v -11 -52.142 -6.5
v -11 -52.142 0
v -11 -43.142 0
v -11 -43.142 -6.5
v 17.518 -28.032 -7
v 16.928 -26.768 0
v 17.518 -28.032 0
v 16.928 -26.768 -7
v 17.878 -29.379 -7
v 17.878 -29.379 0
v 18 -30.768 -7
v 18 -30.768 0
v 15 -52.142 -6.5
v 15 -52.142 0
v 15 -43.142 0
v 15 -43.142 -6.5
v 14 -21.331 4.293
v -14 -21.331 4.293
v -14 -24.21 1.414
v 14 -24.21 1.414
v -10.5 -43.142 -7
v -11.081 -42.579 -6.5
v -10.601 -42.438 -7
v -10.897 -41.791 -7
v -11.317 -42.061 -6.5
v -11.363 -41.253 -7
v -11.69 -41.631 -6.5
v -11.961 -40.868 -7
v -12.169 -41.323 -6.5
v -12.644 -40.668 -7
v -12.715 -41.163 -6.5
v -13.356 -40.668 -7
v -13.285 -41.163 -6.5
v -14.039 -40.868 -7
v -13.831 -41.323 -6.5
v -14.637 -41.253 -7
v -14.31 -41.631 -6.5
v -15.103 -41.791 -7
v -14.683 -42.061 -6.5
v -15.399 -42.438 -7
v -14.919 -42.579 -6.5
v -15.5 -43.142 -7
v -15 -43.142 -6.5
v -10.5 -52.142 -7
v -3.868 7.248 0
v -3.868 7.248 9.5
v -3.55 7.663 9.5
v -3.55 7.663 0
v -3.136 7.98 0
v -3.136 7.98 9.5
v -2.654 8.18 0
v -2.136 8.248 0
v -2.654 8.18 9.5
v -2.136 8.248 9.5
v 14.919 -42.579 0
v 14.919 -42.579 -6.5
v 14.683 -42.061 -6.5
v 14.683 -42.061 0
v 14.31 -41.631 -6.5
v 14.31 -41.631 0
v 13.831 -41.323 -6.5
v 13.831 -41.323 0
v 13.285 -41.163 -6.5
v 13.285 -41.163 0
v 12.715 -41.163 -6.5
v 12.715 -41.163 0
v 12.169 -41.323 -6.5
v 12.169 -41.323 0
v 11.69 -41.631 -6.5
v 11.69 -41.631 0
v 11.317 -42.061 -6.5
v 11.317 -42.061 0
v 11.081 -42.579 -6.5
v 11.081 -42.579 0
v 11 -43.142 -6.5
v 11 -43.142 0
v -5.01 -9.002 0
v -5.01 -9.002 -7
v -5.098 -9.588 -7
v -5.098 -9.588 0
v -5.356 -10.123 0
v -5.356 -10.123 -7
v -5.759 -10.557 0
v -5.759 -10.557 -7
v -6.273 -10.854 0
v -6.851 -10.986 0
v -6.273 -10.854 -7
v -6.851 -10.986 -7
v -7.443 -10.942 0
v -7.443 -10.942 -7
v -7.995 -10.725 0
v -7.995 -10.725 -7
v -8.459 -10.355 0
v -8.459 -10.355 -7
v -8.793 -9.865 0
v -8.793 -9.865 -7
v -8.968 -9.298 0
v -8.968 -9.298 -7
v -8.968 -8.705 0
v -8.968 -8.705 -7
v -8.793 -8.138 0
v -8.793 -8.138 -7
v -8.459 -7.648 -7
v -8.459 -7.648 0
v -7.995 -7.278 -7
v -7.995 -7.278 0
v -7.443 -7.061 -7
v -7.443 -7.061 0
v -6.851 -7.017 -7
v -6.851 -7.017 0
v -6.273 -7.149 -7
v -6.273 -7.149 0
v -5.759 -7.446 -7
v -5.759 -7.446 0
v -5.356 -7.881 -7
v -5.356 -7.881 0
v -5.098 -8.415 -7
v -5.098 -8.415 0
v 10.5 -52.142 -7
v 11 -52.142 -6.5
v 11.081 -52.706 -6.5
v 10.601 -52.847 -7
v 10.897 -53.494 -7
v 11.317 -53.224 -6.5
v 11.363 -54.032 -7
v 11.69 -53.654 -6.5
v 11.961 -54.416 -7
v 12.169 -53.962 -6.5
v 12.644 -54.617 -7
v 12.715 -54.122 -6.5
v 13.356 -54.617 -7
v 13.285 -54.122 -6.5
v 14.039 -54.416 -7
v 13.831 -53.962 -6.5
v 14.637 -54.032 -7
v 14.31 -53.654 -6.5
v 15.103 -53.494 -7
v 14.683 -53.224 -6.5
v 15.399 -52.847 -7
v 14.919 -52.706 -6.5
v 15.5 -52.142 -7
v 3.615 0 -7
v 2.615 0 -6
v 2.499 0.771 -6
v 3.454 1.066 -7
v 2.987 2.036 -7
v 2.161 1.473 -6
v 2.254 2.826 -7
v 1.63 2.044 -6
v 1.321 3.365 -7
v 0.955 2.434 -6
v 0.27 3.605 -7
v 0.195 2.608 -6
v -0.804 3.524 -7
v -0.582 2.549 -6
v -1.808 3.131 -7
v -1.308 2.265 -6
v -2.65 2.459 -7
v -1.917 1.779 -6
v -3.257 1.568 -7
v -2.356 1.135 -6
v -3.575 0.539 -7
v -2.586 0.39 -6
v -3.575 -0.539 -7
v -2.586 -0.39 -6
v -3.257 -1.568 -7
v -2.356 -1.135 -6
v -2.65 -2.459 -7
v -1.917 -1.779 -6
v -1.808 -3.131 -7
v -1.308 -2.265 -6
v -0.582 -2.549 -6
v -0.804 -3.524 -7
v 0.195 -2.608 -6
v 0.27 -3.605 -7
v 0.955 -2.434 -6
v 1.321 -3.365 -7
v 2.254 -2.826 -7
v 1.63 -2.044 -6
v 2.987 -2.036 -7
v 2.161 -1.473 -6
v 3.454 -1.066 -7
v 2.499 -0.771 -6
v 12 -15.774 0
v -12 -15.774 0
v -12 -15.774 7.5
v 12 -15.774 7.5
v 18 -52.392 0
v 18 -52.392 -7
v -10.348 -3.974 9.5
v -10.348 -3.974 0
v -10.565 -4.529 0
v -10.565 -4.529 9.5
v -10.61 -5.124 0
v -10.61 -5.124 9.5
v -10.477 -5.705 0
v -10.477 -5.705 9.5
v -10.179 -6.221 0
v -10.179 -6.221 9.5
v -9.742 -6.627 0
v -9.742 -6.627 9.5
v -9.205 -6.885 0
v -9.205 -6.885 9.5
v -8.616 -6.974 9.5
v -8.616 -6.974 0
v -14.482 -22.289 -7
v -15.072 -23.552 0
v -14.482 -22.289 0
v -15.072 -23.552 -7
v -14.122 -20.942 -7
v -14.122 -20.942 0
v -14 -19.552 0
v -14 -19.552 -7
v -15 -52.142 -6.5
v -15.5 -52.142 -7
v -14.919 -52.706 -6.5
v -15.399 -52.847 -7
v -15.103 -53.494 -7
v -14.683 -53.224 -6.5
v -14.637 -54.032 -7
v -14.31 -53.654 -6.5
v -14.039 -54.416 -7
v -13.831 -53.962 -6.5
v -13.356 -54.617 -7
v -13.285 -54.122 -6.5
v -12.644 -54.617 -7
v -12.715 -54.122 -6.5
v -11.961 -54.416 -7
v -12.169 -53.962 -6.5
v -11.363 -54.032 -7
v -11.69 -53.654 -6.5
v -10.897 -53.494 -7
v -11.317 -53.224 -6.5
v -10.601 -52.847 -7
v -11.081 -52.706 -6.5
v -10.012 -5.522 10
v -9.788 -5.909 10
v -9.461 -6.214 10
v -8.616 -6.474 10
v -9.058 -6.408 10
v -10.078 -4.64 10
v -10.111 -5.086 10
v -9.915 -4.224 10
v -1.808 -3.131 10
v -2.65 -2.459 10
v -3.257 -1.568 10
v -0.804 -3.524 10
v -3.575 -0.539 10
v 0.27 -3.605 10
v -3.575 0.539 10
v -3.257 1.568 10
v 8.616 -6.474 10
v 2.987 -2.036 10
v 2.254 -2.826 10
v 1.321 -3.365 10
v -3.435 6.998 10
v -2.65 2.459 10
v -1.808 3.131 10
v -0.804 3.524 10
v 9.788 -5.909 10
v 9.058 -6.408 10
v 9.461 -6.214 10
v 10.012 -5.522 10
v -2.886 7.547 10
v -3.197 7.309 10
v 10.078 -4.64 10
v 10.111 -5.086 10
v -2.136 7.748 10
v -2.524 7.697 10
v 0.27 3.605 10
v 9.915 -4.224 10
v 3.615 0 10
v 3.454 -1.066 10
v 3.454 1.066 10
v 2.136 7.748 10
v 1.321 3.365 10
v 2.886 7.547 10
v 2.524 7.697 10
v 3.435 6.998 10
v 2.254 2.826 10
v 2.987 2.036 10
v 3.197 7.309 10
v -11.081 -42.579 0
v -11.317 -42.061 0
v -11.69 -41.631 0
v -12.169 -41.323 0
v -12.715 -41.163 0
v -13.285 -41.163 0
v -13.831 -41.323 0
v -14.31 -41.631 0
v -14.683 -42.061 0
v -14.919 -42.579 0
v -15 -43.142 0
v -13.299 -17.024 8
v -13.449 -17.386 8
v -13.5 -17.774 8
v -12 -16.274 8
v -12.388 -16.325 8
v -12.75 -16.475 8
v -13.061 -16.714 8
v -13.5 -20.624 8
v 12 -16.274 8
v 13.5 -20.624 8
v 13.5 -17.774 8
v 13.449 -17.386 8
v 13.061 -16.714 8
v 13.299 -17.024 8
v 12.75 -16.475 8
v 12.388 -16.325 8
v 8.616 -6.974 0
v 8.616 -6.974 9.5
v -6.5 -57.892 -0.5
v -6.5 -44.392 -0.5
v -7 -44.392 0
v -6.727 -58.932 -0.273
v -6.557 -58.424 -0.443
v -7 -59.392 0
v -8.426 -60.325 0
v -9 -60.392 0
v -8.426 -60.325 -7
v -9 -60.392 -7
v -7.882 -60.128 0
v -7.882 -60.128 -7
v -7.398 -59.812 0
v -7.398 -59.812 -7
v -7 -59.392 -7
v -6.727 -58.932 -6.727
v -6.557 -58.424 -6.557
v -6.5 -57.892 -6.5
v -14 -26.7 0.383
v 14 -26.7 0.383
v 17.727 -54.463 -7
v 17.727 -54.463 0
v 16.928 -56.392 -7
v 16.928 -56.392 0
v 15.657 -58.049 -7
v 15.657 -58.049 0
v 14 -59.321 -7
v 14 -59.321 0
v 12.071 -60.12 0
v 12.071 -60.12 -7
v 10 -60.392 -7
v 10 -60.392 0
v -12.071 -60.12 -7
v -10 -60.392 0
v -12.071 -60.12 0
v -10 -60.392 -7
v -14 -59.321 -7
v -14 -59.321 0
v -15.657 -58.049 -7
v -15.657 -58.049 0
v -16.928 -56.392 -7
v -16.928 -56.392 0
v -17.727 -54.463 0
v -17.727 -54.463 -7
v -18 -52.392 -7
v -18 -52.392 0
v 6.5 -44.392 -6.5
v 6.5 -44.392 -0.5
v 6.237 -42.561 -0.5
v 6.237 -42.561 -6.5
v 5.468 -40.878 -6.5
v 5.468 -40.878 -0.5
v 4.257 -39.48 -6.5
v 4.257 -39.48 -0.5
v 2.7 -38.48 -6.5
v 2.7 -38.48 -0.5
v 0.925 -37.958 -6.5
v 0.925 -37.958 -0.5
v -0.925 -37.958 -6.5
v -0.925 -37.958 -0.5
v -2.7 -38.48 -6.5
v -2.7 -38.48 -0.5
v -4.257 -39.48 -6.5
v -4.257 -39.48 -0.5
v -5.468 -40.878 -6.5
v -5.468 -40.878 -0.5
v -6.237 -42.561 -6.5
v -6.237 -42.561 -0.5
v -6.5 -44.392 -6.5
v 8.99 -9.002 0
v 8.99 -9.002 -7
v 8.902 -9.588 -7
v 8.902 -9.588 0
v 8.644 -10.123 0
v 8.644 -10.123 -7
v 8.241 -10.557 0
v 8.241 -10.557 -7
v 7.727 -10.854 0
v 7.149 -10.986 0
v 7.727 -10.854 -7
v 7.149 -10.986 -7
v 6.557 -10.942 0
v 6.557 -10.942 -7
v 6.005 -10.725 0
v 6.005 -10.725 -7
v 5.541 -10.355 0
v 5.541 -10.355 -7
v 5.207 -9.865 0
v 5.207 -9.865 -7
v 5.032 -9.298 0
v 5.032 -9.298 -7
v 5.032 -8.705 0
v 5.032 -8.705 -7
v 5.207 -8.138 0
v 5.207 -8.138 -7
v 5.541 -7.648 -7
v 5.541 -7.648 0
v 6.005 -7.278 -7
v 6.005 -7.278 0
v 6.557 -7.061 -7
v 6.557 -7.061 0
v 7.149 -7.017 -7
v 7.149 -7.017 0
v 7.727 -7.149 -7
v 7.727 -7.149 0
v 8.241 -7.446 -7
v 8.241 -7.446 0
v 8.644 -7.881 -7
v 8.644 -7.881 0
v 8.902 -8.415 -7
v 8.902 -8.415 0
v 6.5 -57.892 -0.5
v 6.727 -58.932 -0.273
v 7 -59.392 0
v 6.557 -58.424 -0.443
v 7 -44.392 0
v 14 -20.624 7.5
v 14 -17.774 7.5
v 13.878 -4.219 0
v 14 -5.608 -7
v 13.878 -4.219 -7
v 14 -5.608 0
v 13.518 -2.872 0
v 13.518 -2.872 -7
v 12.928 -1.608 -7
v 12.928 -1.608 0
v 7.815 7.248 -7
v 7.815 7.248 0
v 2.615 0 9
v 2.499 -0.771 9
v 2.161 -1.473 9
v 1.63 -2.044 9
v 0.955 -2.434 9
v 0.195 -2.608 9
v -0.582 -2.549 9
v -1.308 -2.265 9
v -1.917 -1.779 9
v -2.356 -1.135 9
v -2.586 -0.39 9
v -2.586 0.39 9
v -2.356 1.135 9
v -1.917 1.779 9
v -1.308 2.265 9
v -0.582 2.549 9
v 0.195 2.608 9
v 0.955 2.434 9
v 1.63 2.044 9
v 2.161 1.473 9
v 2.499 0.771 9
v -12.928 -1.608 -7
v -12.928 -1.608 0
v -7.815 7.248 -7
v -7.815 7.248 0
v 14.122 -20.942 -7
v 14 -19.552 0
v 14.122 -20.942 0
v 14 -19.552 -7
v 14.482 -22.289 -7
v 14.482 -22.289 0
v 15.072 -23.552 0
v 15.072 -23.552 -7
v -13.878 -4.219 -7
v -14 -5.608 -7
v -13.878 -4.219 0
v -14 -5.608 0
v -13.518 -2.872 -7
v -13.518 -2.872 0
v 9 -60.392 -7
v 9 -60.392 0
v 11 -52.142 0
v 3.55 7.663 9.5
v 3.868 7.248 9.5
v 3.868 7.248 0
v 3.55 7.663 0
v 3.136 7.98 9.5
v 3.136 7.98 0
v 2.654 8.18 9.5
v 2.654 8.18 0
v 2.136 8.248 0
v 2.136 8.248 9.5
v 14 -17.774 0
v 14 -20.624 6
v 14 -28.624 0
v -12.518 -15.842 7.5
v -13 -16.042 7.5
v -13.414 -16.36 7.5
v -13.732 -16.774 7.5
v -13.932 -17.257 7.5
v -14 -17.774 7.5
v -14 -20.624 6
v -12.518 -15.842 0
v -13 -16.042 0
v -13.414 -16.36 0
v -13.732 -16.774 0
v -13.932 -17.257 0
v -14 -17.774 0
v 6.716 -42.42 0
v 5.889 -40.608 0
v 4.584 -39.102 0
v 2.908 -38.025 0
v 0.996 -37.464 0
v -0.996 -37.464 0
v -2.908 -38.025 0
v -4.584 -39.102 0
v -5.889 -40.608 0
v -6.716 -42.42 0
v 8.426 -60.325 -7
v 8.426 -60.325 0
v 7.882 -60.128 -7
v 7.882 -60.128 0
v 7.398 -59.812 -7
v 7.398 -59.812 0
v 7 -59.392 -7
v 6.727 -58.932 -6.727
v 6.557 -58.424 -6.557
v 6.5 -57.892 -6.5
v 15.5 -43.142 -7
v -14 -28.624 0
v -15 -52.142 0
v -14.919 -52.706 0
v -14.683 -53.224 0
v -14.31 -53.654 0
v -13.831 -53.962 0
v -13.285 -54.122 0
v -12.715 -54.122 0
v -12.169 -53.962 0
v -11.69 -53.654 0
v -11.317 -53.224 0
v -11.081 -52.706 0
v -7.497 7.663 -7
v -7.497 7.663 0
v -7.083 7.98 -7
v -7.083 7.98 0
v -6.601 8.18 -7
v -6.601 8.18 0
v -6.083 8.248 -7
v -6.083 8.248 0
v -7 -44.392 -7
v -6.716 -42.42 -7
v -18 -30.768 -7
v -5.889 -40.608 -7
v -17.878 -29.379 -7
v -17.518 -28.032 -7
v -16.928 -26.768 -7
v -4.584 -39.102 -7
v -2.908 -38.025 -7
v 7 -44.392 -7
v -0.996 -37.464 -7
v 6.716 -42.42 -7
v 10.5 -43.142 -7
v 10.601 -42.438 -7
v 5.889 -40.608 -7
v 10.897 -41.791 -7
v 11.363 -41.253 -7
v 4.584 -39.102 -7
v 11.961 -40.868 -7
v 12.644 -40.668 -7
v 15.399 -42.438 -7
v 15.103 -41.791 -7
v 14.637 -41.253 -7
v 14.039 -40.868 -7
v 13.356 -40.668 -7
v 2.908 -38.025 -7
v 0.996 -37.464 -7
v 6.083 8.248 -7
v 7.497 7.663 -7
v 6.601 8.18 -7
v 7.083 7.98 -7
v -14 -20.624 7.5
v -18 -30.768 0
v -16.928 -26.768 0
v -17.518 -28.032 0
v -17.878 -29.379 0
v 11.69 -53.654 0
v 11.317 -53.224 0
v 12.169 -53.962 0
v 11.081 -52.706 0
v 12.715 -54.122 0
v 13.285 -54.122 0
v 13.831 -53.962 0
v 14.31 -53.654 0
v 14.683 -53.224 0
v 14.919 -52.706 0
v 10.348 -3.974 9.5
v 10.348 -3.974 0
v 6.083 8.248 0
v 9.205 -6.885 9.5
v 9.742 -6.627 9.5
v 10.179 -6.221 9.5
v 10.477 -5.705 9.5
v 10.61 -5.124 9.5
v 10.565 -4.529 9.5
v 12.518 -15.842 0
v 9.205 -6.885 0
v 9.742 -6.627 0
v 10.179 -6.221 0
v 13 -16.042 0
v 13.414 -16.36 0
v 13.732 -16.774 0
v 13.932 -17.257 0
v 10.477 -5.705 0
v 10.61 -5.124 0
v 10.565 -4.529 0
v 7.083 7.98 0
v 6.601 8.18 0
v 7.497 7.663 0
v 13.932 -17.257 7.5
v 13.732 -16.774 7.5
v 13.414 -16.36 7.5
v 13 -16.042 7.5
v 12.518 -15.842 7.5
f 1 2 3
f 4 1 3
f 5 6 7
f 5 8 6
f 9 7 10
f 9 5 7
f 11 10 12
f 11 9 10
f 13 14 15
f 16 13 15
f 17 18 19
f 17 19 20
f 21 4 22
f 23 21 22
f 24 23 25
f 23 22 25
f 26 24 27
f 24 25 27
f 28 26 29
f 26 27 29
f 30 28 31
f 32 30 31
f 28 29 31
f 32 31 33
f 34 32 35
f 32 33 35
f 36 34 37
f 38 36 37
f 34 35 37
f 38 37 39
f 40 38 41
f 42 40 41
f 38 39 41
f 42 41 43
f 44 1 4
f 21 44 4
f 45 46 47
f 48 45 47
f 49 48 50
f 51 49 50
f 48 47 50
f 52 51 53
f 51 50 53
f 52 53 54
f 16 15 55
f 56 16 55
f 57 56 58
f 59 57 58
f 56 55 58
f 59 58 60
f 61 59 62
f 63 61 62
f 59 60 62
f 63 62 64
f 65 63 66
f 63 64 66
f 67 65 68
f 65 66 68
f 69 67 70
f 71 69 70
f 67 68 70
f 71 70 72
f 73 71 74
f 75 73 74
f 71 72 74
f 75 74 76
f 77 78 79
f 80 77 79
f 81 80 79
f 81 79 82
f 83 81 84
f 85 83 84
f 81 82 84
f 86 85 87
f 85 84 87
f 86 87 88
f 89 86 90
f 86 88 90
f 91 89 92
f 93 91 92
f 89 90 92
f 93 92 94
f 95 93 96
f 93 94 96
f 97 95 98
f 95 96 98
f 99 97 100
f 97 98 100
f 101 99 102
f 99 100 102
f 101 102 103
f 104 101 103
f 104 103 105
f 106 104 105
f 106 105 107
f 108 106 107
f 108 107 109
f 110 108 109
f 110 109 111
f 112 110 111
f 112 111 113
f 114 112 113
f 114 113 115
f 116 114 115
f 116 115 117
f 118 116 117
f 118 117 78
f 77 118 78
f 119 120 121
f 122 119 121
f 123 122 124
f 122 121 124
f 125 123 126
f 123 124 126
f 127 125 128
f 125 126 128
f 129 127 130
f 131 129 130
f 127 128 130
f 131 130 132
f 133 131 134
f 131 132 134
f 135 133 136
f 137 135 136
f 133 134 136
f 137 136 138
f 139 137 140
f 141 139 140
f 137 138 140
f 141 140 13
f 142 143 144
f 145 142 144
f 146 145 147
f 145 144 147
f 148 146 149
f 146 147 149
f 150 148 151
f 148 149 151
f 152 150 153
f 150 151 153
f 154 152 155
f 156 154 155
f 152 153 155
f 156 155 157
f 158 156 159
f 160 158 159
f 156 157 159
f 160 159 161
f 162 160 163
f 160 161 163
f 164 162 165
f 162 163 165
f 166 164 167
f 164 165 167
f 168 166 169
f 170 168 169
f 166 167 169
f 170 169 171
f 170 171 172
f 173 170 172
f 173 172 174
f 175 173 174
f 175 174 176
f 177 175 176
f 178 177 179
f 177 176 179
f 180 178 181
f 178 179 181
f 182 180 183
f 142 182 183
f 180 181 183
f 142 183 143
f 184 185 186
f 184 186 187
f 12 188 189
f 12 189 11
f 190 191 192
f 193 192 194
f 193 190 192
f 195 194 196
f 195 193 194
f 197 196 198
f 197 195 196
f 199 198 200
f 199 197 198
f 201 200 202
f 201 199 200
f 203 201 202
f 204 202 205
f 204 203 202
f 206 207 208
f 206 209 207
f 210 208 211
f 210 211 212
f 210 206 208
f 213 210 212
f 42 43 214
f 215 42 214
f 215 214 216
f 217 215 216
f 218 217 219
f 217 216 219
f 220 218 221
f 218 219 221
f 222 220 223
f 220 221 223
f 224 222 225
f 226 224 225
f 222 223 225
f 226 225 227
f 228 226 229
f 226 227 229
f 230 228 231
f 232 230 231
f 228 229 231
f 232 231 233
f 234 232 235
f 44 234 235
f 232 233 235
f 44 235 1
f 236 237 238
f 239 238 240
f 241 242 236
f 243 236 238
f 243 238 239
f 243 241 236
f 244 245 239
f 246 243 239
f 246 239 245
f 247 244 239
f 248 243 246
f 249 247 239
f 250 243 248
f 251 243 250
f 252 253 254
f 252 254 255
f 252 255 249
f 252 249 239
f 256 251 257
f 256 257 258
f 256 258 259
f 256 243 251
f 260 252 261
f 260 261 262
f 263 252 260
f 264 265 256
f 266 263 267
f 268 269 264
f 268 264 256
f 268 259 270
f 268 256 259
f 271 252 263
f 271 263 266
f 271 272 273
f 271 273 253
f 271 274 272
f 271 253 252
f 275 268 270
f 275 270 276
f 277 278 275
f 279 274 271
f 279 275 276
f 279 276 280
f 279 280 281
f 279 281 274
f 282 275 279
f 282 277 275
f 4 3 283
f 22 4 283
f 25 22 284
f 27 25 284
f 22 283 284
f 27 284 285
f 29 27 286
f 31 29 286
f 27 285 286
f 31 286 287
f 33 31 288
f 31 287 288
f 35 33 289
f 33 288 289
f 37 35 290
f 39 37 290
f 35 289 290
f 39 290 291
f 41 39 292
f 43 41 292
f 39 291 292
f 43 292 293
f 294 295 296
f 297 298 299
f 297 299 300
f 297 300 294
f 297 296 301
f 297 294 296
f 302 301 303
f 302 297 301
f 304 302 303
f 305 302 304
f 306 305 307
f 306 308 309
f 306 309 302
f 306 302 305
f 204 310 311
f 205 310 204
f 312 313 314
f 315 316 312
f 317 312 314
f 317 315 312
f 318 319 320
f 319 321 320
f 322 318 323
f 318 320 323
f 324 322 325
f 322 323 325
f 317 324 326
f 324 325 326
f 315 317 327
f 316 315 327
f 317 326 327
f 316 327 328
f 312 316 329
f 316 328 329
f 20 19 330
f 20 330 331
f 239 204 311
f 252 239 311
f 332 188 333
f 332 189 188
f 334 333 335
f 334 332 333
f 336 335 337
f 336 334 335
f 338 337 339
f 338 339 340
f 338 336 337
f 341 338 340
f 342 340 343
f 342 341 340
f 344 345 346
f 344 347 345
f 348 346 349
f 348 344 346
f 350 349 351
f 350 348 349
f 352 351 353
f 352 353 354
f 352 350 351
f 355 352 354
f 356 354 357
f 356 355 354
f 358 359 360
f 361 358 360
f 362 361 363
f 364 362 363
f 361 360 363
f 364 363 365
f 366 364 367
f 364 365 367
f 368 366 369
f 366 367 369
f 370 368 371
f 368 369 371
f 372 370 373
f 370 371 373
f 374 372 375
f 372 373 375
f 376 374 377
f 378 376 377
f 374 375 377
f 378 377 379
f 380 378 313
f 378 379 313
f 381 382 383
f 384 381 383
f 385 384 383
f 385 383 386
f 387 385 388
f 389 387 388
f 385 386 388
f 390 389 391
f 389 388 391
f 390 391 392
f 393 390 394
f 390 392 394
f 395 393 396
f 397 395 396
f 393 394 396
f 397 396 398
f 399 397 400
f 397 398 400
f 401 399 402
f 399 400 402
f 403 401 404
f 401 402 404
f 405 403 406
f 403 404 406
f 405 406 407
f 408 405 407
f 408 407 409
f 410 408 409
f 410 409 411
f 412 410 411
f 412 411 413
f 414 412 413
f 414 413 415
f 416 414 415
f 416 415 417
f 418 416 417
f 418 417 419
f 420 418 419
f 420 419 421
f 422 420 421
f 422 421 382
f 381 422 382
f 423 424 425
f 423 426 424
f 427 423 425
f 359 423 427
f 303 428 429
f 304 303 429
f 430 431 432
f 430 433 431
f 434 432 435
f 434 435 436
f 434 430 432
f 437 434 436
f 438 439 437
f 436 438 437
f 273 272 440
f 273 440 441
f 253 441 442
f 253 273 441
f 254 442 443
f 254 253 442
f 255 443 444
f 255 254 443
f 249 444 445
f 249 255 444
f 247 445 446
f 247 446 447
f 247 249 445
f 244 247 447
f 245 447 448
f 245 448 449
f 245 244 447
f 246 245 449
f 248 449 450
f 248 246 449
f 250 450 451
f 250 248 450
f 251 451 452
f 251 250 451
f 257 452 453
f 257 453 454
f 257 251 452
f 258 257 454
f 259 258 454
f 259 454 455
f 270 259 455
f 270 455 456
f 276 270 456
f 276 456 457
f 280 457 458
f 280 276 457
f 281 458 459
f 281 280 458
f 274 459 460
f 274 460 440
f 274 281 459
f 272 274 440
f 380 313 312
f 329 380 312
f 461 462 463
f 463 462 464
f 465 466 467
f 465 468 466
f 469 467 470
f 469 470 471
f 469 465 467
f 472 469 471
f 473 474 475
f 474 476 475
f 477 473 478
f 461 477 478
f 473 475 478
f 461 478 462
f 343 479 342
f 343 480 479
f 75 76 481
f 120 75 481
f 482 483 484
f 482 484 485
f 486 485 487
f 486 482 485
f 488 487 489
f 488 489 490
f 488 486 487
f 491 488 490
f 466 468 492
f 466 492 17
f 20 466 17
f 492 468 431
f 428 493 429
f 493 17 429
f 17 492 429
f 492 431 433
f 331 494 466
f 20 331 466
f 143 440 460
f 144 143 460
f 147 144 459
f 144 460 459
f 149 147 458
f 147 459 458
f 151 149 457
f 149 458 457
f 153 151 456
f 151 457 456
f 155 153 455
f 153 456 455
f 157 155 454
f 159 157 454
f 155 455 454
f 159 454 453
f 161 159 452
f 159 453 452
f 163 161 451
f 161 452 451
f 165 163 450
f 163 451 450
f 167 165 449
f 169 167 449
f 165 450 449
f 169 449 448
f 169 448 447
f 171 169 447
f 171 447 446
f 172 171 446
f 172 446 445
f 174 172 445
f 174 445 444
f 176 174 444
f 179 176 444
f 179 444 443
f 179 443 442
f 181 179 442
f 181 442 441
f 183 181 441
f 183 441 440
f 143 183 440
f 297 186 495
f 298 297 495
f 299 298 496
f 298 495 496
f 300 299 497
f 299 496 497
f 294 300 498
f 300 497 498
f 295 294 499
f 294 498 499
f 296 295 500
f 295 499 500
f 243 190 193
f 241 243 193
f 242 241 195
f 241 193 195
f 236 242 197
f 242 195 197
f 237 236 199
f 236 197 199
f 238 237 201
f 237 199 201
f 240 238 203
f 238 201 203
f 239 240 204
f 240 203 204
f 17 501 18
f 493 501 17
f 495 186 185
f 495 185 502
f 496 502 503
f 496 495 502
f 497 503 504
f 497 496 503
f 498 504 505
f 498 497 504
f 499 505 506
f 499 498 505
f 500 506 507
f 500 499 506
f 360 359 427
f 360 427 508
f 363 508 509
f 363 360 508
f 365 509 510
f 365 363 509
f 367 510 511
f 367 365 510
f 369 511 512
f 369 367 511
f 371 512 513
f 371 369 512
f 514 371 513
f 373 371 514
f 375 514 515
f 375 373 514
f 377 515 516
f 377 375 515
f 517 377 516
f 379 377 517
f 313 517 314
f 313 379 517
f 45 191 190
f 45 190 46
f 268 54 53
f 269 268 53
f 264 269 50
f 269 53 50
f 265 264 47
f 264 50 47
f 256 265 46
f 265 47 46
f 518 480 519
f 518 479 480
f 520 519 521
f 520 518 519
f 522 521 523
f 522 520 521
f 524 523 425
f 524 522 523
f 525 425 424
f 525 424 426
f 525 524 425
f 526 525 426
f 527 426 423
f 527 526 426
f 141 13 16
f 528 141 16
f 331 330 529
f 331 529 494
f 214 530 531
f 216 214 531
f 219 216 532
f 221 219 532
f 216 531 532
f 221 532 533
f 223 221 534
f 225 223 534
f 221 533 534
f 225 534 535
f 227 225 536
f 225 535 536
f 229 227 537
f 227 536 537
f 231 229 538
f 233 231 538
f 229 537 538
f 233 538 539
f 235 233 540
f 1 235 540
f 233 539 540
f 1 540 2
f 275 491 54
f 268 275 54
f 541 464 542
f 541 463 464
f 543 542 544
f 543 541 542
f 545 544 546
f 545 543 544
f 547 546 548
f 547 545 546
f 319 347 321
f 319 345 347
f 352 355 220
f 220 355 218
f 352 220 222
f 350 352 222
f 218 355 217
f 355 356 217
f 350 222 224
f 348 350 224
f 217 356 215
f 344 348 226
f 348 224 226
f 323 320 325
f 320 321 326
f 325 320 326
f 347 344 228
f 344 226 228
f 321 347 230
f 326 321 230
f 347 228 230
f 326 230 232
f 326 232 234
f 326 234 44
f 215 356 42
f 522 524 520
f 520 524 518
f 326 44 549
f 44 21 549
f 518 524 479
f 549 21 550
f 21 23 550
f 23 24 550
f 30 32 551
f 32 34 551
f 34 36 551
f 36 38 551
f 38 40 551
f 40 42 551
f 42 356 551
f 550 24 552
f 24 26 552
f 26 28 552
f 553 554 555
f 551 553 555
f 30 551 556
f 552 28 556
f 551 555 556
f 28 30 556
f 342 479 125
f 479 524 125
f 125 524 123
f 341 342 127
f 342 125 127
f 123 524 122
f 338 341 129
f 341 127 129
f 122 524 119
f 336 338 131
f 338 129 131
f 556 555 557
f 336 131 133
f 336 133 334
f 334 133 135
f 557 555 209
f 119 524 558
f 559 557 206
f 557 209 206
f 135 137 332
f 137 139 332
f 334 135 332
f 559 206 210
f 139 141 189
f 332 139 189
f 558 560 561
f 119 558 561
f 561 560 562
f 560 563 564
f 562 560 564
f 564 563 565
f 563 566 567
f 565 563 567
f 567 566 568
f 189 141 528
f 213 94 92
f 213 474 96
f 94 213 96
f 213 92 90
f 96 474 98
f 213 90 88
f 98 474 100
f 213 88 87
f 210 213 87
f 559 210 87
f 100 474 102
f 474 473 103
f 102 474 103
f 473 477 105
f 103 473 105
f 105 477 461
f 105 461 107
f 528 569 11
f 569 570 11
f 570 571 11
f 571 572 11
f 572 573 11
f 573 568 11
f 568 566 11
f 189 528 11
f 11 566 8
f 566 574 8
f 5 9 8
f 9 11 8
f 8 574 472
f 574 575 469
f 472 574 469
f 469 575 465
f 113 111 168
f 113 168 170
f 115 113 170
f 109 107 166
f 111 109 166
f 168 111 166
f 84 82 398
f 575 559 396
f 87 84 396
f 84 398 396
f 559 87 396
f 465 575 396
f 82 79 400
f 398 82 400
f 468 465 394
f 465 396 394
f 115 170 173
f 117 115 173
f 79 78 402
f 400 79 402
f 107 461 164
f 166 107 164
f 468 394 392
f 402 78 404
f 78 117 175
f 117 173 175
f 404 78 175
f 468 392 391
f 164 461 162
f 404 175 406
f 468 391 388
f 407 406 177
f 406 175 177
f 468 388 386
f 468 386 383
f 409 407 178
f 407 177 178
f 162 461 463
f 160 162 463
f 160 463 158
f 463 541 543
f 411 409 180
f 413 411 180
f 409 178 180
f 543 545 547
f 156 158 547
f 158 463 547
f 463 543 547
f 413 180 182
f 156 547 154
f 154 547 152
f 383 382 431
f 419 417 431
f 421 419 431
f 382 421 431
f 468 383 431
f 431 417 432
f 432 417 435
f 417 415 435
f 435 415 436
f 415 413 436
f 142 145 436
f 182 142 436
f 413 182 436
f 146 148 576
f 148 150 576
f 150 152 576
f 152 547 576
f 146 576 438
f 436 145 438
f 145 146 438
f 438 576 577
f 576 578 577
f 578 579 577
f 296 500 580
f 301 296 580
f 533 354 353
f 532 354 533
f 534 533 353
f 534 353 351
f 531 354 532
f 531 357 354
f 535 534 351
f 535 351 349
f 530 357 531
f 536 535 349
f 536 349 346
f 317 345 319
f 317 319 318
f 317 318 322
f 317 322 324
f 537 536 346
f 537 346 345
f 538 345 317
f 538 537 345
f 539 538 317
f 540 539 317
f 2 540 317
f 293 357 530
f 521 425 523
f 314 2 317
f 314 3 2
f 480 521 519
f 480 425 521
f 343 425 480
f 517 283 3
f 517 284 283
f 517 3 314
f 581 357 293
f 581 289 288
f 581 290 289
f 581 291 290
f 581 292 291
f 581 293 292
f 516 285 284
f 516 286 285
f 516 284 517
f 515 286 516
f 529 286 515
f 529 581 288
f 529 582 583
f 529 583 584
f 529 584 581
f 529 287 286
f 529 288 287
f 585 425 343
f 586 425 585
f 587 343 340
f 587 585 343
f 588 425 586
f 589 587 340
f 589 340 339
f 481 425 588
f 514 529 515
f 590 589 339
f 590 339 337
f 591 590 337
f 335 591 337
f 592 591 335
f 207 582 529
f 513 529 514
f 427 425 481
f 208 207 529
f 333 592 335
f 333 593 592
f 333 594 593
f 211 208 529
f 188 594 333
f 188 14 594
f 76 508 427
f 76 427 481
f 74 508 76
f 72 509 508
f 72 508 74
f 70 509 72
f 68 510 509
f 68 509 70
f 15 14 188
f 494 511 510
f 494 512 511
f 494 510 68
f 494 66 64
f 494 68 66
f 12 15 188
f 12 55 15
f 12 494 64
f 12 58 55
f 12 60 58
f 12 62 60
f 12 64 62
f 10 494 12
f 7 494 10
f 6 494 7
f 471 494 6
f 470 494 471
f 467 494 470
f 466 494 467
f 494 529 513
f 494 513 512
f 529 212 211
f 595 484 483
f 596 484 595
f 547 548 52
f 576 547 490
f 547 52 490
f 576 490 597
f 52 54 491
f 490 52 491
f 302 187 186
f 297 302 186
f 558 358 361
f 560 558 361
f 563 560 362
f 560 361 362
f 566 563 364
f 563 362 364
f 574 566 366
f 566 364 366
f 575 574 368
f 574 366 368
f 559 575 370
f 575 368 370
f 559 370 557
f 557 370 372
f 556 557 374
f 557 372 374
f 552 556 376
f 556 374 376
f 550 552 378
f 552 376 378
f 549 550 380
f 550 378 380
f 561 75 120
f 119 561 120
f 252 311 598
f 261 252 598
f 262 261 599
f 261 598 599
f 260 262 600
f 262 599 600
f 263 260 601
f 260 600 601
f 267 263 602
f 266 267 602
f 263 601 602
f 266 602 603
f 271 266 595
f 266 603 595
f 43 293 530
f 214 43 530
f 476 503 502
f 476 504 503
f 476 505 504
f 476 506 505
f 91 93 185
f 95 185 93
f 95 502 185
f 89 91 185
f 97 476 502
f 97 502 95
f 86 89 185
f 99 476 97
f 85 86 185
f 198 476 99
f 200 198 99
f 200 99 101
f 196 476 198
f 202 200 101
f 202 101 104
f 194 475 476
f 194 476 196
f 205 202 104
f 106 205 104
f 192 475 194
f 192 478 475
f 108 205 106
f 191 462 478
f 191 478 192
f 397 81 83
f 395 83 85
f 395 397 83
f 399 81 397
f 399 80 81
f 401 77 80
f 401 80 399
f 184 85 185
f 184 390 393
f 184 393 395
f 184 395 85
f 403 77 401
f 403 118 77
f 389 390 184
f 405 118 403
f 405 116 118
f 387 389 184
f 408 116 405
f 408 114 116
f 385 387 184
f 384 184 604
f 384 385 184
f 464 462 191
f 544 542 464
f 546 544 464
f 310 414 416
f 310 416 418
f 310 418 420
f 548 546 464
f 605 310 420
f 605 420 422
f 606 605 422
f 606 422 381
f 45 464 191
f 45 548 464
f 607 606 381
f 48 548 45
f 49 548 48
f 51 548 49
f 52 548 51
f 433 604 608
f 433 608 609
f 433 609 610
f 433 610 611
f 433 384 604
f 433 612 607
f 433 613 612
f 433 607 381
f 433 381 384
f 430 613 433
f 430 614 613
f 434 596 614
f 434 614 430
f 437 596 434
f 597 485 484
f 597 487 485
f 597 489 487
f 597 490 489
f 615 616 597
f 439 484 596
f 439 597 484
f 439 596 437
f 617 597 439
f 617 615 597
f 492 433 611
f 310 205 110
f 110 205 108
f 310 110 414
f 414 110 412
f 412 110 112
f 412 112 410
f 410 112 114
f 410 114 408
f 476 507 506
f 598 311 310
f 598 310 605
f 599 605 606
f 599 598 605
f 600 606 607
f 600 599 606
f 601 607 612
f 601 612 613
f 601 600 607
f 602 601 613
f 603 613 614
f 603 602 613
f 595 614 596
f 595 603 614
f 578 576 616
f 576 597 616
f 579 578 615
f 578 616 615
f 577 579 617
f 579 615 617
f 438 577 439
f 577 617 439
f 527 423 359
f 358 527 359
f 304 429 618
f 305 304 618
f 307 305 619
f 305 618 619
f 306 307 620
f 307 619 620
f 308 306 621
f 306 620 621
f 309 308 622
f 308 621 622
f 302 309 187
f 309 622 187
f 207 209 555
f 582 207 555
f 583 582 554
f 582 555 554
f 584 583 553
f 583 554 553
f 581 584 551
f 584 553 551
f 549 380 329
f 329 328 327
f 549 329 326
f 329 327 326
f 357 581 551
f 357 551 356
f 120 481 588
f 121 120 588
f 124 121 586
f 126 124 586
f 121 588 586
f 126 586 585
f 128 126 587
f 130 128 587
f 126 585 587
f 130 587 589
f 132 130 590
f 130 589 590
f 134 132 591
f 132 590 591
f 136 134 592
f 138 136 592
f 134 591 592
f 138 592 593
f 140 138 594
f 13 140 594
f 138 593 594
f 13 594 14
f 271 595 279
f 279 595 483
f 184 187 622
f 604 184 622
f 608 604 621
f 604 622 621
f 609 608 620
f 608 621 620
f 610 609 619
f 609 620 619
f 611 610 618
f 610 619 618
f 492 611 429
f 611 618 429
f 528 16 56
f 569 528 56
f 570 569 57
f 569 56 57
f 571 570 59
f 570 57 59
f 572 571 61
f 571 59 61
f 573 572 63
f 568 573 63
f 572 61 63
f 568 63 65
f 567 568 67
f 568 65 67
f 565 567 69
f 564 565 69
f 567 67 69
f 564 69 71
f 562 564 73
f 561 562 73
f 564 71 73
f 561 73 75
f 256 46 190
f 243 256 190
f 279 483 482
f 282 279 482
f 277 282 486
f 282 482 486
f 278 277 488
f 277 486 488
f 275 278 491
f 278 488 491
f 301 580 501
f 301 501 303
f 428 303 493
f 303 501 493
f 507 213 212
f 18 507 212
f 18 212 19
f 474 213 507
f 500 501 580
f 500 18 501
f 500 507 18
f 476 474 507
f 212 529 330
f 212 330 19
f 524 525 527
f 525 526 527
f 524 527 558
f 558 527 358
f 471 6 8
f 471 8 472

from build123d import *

# Parameters (mm, degrees)
F1_DEPTH      = 10
F3_DEPTH      = 7
F4_R          = 2.615
F4_W          = 5
F4_H          = 10
F5_DEPTH      = 10.001
F5_DEPTH_BACK = 25
F6_W          = 28
F6_H          = 7
F7_DEPTH      = 50
F8_W          = 28
F8_H          = 5
F9_DEPTH      = 8
F10_SIZE      = 5
F11_SIZE      = 2
F12_SIZE      = 1
F13_SIZE      = 1
F14_R         = 8
F15_SIZE      = 1
F17_DEPTH     = 10.001
F18_R         = 2
F20_DEPTH     = 7.001
F22_DEPTH     = 7
F23_R         = 8
F25_DEPTH     = 7.001
F26_SIZE      = 0.5
F27_R         = 1.99
F28_DEPTH     = 17.001
F29_R         = 2.5


# Not quite as in the source:
# - a feature names something its author has since deleted; it is built from what else it names


with BuildPart() as f1:
    # F0 (on Top) → F1 (new body)
    with BuildSketch(Plane.XY):
        Polygon((0, 14.2484272933), (-12.3395, -7.1242136467), (12.3395, -7.1242136467), align=None)
    extrude(amount=F1_DEPTH)

    # F2 (on face) → F3 (join)
    with BuildSketch(Plane(origin=(0, 0, 0), x_dir=(1, 0, 0), z_dir=(0, 0, -1))):
        Polygon((-18, 10.3923048454), (0, -20.7846096908), (18, 10.3923048454), align=None)
    extrude(amount=F3_DEPTH)

    # F4 (on Top) → F5 (cut, two sides)
    with BuildSketch(Plane.XY) as f5_sk:
        Polygon((-11.5514649078, 20.9689907423), (-11.4649338648, 8.2484272933), (13.3285973679, 8.2484272933), (13.3285973679, 20.9689907423), align=None)
        Circle(F4_R)
        with Locations((-16.5, -8)):
            Rectangle(F4_W, F4_H)
        with Locations((16.5, -8)):
            Rectangle(F4_W, F4_H)
    extrude(amount=F5_DEPTH, mode=Mode.SUBTRACT)
    extrude(f5_sk.sketch, amount=-F5_DEPTH_BACK, mode=Mode.SUBTRACT)

    # F6 (on face) → F7 (join)
    with BuildSketch(Plane.XZ.offset(10.3923048454)):
        with Locations((0, -3.5)):
            Rectangle(F6_W, F6_H)
    extrude(amount=F7_DEPTH)

    # F8 (on face) → F9 (join)
    with BuildSketch(Plane.XY):
        with Locations((0, -18.1242136467)):
            Rectangle(F8_W, F8_H)
    extrude(amount=F9_DEPTH)

    # F10
    f10_edges = [f1.edges().sort_by_distance(p)[0] for p in [
        (0, -20.624214, 0),
    ]]
    chamfer(f10_edges, length=F10_SIZE)

    # F11
    f11_edges = [f1.edges().sort_by_distance(p)[0] for p in [
        (0, -25.624214, 0),
    ]]
    chamfer(f11_edges, length=F11_SIZE)

    # F12
    f12_edges = [f1.edges().sort_by_distance(p)[0] for p in [
        (0, -27.624214, 0),
    ]]
    chamfer(f12_edges, length=F12_SIZE)

    # F13
    f13_edges = [f1.edges().sort_by_distance(p)[0] for p in [
        (0, -20.624214, 5),
    ]]
    chamfer(f13_edges, length=F13_SIZE)

    # F14
    f14_edges = [f1.edges().sort_by_distance(p)[0] for p in [
        (-14, -3.464102, -3.5),
        (14, -3.464102, -3.5),
    ]]
    fillet(f14_edges, radius=F14_R)

    # F15
    f15_edges = [f1.edges().sort_by_distance(p)[0] for p in [
        (-2.615, 0, 10),
        (-2.615, 0, -7),
    ]]
    chamfer(f15_edges, length=F15_SIZE)

    # F16 (on face) → F17 (cut, through all)
    with BuildSketch(Plane.XY):
        Polygon((12.0796923789, -6.9742136467), (-12.0796923789, -6.9742136467), (-3.2908965344, 8.2484272933), (-14, 8.2484272933), (-14, -15.7742136467), (14, -15.7742136467), (14, 8.2484272933), (7.2377682818, 8.2484272933), (3.2908965344, 8.2484272933), align=None)
    extrude(amount=F17_DEPTH, mode=Mode.SUBTRACT)

    # F18
    f18_edges = [f1.edges().sort_by_distance(p)[0] for p in [
        (-12.079692, -6.974214, 5),
        (12.079692, -6.974214, 5),
        (3.290897, 8.248427, 5),
        (-3.290897, 8.248427, 5),
        (-7.237768, 8.248427, -3.5),
        (7.237768, 8.248427, -3.5),
        (-14, -15.774214, 4),
        (14, -15.774214, 4),
    ]]
    fillet(f18_edges, radius=F18_R)

    # F19 (on face) → F20 (cut, through all)
    with BuildSketch(Plane.XY):
        with BuildLine():
            Line((6.5, -50.8923048454), (6.5, -44.3923048454))
            ThreePointArc((6.5, -44.3923048454), (0, -37.8923048454), (-6.5, -44.3923048454))
            Line((-6.5, -44.3923048454), (-6.5, -50.8923048454))
            Line((-6.5, -50.8923048454), (-6.5, -60.3923048454))
            Line((-6.5, -60.3923048454), (6.5, -60.3923048454))
            Line((6.5, -60.3923048454), (6.5, -50.8923048454))
        make_face()
    extrude(amount=-F20_DEPTH, mode=Mode.SUBTRACT)

    # F21 (on face) → F22 (join, through all)
    with BuildSketch(Plane.XY):
        Polygon((-14, -60.3923048454), (-14, -28.6242136467), (-14, -21.6960104164), (-18, -28.6242136467), (-18, -60.3923048454), align=None)
        Polygon((14, -28.6242136467), (14, -60.3923048454), (18, -60.3923048454), (18, -28.6242136467), (14, -21.6960104164), align=None)
    extrude(amount=-F22_DEPTH)

    # F23
    f23_edges = [f1.edges().sort_by_distance(p)[0] for p in [
        (18, -28.624214, -3.5),
        (14, -21.69601, -3.5),
        (-14, -21.69601, -3.5),
        (-18, -28.624214, -3.5),
        (-18, -60.392305, -3.5),
        (18, -60.392305, -3.5),
    ]]
    fillet(f23_edges, radius=F23_R)

    # F24 (on face) → F25 (cut, through all)
    with BuildSketch(Plane.XY):
        with BuildLine():
            Line((-11, -52.1423048454), (-11, -43.1423048454))
            ThreePointArc((-11, -43.1423048454), (-13, -41.1423048454), (-15, -43.1423048454))
            Line((-15, -43.1423048454), (-15, -52.1423048454))
            ThreePointArc((-15, -52.1423048454), (-13, -54.1423048454), (-11, -52.1423048454))
        make_face()
        with BuildLine():
            Line((15, -52.1423048454), (15, -43.1423048454))
            ThreePointArc((15, -43.1423048454), (13, -41.1423048454), (11, -43.1423048454))
            Line((11, -43.1423048454), (11, -52.1423048454))
            ThreePointArc((11, -52.1423048454), (13, -54.1423048454), (15, -52.1423048454))
        make_face()
    extrude(amount=-F25_DEPTH, mode=Mode.SUBTRACT)

    # F26
    f26_edges = [f1.edges().sort_by_distance(p)[0] for p in [
        (6.5, -52.392305, -7),
        (6.5, -52.392305, 0),
        (0, -6.974214, 10),
        (0, -15.774214, 8),
        (0, -37.892305, -7),
        (-6.5, -52.392305, -7),
        (-11, -47.642305, -7),
        (-13, -54.142305, -7),
        (-15, -47.642305, -7),
        (-13, -41.142305, -7),
        (15, -47.642305, -7),
        (13, -54.142305, -7),
        (11, -47.642305, -7),
        (13, -41.142305, -7),
        (-6.5, -52.392305, 0),
        (0, -37.892305, 0),
        (14, -19.199214, 8),
        (13.414214, -16.36, 8),
        (-14, -19.199214, 8),
        (-13.414214, -16.36, 8),
        (3.136196, 7.980478, 10),
        (7.107944, 1.637107, 10),
        (10.347642, -5.974214, 10),
        (0, 8.248427, 10),
        (-10.347642, -5.974214, 10),
        (-3.136196, 7.980478, 10),
        (-7.107944, 1.637107, 10),
    ]]
    chamfer(f26_edges, length=F26_SIZE)

    # F27 (on face) → F28 (cut, through all)
    with BuildSketch(Plane(origin=(0, 0, -7), x_dir=(1, 0, 0), z_dir=(0, 0, -1))):
        with Locations((-7, 9.0015727067)):
            Circle(F27_R)
        with Locations((7, 9.0015727067)):
            Circle(F27_R)
    extrude(amount=-F28_DEPTH, mode=Mode.SUBTRACT)

    # F29
    f29_edges = [f1.edges().sort_by_distance(p)[0] for p in [
        (-6.5, -60.392305, -3.5),
        (6.5, -60.392305, -3.5),
    ]]
    fillet(f29_edges, radius=F29_R)


solid = f1.part
